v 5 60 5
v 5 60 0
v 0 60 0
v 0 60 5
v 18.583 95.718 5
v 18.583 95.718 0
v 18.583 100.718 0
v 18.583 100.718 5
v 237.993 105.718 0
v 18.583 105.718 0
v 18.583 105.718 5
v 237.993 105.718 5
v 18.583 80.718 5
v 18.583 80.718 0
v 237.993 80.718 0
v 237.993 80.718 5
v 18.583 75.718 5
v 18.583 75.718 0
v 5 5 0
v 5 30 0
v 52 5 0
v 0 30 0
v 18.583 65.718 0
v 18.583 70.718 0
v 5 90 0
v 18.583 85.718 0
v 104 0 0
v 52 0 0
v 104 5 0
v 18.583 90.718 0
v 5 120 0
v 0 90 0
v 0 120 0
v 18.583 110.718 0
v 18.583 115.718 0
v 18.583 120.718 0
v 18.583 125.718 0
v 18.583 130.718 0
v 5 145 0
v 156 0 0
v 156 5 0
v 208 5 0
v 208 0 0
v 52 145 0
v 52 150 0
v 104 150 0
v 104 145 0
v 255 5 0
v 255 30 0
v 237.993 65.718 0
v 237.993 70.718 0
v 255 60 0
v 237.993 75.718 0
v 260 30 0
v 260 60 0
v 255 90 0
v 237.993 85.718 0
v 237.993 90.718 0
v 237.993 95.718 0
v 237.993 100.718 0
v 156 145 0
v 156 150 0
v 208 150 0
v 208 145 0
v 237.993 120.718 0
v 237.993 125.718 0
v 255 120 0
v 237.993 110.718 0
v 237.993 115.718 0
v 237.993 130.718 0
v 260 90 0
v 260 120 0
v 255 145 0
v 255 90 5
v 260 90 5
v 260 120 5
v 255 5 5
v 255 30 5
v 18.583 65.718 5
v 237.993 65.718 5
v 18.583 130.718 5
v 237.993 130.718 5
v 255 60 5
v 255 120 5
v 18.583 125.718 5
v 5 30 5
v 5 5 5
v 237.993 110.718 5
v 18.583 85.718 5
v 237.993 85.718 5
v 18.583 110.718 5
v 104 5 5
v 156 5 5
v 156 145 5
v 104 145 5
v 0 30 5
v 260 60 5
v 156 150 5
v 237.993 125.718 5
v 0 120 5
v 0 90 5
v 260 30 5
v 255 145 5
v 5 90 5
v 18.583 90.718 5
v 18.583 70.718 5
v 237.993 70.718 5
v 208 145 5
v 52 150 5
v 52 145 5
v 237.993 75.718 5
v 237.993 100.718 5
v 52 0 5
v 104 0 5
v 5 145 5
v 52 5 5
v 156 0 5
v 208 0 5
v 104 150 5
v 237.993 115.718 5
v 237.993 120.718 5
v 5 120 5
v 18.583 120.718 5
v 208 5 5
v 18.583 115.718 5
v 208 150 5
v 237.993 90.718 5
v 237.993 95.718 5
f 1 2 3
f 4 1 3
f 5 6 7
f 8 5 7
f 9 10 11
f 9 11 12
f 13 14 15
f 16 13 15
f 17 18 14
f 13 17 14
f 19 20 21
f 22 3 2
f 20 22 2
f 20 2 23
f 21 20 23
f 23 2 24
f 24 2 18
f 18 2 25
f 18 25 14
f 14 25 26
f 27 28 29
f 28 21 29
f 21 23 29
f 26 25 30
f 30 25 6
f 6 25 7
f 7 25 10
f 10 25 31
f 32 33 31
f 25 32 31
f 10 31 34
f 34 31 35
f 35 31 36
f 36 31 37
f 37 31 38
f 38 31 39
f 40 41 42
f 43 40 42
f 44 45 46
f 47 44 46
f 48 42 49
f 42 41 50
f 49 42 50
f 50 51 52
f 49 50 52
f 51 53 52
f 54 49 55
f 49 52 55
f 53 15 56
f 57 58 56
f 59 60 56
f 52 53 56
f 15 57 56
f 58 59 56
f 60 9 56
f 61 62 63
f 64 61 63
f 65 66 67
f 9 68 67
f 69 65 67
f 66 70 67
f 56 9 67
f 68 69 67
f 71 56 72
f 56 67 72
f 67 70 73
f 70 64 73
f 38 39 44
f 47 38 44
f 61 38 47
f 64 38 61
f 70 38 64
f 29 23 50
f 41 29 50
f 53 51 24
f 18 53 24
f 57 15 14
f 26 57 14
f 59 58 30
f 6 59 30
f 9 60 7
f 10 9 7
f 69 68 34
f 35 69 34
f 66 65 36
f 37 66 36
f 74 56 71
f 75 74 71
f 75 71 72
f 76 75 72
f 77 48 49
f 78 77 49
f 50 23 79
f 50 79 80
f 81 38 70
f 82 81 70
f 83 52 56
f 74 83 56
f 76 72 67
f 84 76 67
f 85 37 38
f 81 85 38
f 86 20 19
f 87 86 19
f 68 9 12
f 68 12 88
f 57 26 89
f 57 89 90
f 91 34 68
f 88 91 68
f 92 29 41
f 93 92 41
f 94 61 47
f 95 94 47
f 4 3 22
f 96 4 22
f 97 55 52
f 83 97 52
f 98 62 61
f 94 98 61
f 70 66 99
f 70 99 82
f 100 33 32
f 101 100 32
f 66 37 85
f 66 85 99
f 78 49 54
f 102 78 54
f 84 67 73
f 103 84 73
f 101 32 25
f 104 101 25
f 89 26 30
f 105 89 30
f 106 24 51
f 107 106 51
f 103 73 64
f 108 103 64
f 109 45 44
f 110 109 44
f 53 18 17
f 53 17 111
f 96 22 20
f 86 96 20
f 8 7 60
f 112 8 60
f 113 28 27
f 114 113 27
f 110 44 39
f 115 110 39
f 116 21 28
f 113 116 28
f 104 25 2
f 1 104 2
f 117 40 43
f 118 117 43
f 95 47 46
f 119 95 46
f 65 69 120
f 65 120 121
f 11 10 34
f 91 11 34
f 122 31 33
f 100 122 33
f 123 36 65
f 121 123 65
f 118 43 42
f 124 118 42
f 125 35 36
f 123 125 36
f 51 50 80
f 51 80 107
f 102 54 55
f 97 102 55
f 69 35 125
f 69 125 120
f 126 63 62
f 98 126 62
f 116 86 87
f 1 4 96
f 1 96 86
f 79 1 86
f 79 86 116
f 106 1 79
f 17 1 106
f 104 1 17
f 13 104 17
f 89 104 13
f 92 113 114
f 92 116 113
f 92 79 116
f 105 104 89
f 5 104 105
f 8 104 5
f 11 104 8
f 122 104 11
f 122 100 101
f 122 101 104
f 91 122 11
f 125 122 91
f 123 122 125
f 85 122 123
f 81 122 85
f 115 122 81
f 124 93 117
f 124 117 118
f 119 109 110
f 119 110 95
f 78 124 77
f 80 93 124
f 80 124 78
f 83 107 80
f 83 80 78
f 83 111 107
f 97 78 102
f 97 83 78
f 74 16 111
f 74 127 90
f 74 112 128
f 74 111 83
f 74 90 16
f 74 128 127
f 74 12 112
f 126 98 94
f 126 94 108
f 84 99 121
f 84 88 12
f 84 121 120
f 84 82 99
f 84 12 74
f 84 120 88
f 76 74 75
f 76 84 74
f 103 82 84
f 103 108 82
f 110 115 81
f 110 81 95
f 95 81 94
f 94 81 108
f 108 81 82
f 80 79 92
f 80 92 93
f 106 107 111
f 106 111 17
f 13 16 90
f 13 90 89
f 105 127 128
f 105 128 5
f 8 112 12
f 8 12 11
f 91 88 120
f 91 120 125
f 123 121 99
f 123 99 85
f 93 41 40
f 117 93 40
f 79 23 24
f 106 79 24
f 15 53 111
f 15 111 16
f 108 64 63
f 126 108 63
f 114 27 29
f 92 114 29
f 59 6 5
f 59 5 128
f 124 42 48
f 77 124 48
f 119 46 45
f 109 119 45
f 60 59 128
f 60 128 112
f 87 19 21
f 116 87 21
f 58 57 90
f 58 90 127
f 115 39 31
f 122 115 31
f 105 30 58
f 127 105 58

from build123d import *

# Parameters (mm, degrees)
CROQUIS1_W              = 219.410669775
CROQUIS1_H              = 5
SALIENTE_EXTRUIR1_DEPTH = 5


with BuildPart() as part:
    # Croquis1 → Saliente-Extruir1 (new body)
    with BuildSketch(Plane.XY):
        Polygon((52, 0), (104, 0), (104, 5), (156, 5), (156, 0), (208, 0), (208, 5), (255, 5), (255, 30), (260, 30), (260, 60), (255, 60), (255, 90), (260, 90), (260, 120), (255, 120), (255, 145), (208, 145), (208, 150), (156, 150), (156, 145), (104, 145), (104, 150), (52, 150), (52, 145), (5, 145), (5, 120), (0, 120), (0, 90), (5, 90), (5, 60), (0, 60), (0, 30), (5, 30), (5, 5), (52, 5), align=None)
        with Locations((128.287883766, 128.217905572)):
            Rectangle(CROQUIS1_W, CROQUIS1_H, mode=Mode.SUBTRACT)
        with Locations((128.287883766, 118.217905572)):
            Rectangle(CROQUIS1_W, CROQUIS1_H, mode=Mode.SUBTRACT)
        with Locations((128.287883766, 108.217905572)):
            Rectangle(CROQUIS1_W, CROQUIS1_H, mode=Mode.SUBTRACT)
        with Locations((128.287883766, 98.217905572)):
            Rectangle(CROQUIS1_W, CROQUIS1_H, mode=Mode.SUBTRACT)
        with Locations((128.287883766, 88.217905572)):
            Rectangle(CROQUIS1_W, CROQUIS1_H, mode=Mode.SUBTRACT)
        with Locations((128.287883766, 78.217905572)):
            Rectangle(CROQUIS1_W, CROQUIS1_H, mode=Mode.SUBTRACT)
        with Locations((128.287883766, 68.217905572)):
            Rectangle(CROQUIS1_W, CROQUIS1_H, mode=Mode.SUBTRACT)
    extrude(amount=SALIENTE_EXTRUIR1_DEPTH)


solid = part.part
